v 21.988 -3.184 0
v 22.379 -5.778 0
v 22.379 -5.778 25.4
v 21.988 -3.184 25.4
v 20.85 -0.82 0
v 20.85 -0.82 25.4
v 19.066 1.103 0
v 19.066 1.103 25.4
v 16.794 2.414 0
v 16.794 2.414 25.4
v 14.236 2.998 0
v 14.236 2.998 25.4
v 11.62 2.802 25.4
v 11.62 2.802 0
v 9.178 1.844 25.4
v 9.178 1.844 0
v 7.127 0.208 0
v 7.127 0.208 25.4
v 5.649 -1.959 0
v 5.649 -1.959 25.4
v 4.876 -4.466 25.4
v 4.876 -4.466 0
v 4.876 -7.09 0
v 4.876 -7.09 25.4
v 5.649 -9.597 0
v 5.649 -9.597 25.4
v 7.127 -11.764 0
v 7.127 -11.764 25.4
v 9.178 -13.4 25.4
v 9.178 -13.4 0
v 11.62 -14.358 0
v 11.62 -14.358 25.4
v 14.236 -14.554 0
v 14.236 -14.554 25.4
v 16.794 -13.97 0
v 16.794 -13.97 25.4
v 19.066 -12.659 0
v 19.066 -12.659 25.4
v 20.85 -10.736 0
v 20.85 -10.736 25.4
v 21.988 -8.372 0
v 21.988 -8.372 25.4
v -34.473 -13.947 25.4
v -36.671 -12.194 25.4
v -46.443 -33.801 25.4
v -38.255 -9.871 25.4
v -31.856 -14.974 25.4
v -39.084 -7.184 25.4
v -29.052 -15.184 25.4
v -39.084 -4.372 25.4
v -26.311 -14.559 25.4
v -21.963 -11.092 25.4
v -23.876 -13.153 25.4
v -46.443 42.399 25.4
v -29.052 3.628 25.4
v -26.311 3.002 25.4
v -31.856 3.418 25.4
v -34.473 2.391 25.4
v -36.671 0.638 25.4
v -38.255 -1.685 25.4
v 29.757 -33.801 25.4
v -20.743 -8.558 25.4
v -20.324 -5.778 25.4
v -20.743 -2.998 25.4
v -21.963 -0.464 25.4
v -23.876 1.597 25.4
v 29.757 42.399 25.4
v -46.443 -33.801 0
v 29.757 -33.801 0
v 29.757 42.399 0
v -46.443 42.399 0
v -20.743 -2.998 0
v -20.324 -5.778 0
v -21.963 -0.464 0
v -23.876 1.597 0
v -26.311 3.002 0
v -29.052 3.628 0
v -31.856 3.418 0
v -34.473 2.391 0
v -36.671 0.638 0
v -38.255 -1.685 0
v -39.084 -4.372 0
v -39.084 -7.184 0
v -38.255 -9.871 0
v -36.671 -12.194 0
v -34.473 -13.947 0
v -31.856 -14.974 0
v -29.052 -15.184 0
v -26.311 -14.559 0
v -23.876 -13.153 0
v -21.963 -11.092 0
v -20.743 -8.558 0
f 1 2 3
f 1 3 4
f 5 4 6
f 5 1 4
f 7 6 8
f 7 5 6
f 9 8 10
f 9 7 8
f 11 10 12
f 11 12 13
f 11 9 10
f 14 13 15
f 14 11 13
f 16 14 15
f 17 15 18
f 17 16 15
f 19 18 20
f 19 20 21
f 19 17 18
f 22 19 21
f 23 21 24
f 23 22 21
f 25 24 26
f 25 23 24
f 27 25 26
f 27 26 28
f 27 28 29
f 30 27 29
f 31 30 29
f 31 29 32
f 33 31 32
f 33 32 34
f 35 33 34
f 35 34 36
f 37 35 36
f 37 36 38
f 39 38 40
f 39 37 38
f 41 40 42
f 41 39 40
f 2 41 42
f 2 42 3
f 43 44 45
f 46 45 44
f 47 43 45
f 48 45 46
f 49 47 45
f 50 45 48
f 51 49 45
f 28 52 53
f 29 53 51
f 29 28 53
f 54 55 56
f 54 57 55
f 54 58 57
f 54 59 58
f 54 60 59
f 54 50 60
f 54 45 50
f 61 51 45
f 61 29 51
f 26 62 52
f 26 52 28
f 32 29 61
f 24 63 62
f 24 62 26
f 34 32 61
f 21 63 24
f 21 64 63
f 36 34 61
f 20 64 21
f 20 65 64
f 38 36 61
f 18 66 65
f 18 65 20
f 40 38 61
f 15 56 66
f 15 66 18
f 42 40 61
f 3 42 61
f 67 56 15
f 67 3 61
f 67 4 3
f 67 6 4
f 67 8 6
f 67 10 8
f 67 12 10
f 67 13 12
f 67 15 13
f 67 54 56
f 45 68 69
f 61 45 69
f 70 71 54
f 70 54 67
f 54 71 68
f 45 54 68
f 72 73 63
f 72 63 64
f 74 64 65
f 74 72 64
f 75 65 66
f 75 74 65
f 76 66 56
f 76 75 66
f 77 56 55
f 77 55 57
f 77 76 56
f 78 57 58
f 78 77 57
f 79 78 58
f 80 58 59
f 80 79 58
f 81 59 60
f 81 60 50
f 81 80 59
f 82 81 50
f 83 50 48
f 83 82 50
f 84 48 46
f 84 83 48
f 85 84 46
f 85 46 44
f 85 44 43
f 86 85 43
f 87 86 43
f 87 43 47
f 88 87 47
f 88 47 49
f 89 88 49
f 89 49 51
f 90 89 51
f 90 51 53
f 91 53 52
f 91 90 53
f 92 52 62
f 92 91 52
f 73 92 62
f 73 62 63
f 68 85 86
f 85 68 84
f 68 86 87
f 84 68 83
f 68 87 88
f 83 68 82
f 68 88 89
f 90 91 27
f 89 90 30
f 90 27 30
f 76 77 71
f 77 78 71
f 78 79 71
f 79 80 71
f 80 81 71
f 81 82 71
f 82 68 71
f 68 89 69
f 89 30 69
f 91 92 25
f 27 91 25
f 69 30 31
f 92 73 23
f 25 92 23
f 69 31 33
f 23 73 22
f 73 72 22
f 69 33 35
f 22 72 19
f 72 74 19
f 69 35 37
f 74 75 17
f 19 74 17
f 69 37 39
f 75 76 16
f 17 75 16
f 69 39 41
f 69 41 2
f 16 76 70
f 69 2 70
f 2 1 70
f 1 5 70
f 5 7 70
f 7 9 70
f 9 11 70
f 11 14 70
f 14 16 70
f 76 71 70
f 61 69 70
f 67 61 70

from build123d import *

# Parameters (mm, degrees)
F0_W     = 76.2
F0_H     = 27.3757269502
F0_H_2   = 48.8242730498
F0_R     = 9.4325201181
F0_R_2   = 8.8008195624
F1_DEPTH = 25.4


with BuildPart() as f1:
    # F0 (on Top) → F1 (new body)
    with BuildSketch(Plane.XY):
        with Locations((-8.3431932092, 28.7107112765)):
            Rectangle(F0_W, F0_H)
        with Locations((-8.3431932092, -9.3892887235)):
            Rectangle(F0_W, F0_H_2)
        with Locations((-29.7568067908, -5.7780258358)):
            Circle(F0_R, mode=Mode.SUBTRACT)
        with Locations((13.5783478618, -5.7780258358)):
            Circle(F0_R_2, mode=Mode.SUBTRACT)
    extrude(amount=F1_DEPTH)


solid = f1.part
